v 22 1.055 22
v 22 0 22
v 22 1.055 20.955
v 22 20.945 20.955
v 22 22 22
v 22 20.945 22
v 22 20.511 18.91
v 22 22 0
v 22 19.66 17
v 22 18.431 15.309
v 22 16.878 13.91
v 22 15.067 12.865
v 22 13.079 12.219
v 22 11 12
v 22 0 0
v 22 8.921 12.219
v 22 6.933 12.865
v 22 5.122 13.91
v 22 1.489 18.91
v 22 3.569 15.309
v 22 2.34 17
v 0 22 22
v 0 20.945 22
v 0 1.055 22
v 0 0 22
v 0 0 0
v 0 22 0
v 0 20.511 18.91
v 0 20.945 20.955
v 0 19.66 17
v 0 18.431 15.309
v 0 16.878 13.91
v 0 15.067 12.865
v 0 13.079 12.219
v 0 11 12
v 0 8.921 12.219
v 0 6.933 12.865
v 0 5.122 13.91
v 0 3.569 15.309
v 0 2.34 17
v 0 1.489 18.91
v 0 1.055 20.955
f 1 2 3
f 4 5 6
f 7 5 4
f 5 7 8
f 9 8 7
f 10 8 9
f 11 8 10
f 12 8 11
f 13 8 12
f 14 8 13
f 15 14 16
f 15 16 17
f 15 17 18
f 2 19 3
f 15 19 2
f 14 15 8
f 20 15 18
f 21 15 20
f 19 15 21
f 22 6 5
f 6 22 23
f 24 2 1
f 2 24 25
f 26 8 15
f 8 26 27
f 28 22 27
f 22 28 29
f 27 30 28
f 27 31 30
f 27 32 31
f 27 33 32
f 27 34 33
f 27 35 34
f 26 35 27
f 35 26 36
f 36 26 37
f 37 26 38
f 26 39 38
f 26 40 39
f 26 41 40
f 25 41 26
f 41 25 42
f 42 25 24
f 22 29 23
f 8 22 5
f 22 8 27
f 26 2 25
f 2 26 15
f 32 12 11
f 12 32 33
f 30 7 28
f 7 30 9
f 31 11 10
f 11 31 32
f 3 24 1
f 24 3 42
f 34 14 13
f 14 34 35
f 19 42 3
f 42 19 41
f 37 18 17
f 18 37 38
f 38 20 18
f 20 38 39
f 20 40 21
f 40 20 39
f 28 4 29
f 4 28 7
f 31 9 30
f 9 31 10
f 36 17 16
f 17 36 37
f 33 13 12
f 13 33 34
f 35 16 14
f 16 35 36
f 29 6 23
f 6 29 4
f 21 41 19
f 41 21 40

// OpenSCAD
difference() {
    cube([22,22,22]);
    
    
    translate([-.1,11,22])
    rotate([0,90,0])
    cylinder(h = 24, r1 = 10, r2 = 10);
    
    }
